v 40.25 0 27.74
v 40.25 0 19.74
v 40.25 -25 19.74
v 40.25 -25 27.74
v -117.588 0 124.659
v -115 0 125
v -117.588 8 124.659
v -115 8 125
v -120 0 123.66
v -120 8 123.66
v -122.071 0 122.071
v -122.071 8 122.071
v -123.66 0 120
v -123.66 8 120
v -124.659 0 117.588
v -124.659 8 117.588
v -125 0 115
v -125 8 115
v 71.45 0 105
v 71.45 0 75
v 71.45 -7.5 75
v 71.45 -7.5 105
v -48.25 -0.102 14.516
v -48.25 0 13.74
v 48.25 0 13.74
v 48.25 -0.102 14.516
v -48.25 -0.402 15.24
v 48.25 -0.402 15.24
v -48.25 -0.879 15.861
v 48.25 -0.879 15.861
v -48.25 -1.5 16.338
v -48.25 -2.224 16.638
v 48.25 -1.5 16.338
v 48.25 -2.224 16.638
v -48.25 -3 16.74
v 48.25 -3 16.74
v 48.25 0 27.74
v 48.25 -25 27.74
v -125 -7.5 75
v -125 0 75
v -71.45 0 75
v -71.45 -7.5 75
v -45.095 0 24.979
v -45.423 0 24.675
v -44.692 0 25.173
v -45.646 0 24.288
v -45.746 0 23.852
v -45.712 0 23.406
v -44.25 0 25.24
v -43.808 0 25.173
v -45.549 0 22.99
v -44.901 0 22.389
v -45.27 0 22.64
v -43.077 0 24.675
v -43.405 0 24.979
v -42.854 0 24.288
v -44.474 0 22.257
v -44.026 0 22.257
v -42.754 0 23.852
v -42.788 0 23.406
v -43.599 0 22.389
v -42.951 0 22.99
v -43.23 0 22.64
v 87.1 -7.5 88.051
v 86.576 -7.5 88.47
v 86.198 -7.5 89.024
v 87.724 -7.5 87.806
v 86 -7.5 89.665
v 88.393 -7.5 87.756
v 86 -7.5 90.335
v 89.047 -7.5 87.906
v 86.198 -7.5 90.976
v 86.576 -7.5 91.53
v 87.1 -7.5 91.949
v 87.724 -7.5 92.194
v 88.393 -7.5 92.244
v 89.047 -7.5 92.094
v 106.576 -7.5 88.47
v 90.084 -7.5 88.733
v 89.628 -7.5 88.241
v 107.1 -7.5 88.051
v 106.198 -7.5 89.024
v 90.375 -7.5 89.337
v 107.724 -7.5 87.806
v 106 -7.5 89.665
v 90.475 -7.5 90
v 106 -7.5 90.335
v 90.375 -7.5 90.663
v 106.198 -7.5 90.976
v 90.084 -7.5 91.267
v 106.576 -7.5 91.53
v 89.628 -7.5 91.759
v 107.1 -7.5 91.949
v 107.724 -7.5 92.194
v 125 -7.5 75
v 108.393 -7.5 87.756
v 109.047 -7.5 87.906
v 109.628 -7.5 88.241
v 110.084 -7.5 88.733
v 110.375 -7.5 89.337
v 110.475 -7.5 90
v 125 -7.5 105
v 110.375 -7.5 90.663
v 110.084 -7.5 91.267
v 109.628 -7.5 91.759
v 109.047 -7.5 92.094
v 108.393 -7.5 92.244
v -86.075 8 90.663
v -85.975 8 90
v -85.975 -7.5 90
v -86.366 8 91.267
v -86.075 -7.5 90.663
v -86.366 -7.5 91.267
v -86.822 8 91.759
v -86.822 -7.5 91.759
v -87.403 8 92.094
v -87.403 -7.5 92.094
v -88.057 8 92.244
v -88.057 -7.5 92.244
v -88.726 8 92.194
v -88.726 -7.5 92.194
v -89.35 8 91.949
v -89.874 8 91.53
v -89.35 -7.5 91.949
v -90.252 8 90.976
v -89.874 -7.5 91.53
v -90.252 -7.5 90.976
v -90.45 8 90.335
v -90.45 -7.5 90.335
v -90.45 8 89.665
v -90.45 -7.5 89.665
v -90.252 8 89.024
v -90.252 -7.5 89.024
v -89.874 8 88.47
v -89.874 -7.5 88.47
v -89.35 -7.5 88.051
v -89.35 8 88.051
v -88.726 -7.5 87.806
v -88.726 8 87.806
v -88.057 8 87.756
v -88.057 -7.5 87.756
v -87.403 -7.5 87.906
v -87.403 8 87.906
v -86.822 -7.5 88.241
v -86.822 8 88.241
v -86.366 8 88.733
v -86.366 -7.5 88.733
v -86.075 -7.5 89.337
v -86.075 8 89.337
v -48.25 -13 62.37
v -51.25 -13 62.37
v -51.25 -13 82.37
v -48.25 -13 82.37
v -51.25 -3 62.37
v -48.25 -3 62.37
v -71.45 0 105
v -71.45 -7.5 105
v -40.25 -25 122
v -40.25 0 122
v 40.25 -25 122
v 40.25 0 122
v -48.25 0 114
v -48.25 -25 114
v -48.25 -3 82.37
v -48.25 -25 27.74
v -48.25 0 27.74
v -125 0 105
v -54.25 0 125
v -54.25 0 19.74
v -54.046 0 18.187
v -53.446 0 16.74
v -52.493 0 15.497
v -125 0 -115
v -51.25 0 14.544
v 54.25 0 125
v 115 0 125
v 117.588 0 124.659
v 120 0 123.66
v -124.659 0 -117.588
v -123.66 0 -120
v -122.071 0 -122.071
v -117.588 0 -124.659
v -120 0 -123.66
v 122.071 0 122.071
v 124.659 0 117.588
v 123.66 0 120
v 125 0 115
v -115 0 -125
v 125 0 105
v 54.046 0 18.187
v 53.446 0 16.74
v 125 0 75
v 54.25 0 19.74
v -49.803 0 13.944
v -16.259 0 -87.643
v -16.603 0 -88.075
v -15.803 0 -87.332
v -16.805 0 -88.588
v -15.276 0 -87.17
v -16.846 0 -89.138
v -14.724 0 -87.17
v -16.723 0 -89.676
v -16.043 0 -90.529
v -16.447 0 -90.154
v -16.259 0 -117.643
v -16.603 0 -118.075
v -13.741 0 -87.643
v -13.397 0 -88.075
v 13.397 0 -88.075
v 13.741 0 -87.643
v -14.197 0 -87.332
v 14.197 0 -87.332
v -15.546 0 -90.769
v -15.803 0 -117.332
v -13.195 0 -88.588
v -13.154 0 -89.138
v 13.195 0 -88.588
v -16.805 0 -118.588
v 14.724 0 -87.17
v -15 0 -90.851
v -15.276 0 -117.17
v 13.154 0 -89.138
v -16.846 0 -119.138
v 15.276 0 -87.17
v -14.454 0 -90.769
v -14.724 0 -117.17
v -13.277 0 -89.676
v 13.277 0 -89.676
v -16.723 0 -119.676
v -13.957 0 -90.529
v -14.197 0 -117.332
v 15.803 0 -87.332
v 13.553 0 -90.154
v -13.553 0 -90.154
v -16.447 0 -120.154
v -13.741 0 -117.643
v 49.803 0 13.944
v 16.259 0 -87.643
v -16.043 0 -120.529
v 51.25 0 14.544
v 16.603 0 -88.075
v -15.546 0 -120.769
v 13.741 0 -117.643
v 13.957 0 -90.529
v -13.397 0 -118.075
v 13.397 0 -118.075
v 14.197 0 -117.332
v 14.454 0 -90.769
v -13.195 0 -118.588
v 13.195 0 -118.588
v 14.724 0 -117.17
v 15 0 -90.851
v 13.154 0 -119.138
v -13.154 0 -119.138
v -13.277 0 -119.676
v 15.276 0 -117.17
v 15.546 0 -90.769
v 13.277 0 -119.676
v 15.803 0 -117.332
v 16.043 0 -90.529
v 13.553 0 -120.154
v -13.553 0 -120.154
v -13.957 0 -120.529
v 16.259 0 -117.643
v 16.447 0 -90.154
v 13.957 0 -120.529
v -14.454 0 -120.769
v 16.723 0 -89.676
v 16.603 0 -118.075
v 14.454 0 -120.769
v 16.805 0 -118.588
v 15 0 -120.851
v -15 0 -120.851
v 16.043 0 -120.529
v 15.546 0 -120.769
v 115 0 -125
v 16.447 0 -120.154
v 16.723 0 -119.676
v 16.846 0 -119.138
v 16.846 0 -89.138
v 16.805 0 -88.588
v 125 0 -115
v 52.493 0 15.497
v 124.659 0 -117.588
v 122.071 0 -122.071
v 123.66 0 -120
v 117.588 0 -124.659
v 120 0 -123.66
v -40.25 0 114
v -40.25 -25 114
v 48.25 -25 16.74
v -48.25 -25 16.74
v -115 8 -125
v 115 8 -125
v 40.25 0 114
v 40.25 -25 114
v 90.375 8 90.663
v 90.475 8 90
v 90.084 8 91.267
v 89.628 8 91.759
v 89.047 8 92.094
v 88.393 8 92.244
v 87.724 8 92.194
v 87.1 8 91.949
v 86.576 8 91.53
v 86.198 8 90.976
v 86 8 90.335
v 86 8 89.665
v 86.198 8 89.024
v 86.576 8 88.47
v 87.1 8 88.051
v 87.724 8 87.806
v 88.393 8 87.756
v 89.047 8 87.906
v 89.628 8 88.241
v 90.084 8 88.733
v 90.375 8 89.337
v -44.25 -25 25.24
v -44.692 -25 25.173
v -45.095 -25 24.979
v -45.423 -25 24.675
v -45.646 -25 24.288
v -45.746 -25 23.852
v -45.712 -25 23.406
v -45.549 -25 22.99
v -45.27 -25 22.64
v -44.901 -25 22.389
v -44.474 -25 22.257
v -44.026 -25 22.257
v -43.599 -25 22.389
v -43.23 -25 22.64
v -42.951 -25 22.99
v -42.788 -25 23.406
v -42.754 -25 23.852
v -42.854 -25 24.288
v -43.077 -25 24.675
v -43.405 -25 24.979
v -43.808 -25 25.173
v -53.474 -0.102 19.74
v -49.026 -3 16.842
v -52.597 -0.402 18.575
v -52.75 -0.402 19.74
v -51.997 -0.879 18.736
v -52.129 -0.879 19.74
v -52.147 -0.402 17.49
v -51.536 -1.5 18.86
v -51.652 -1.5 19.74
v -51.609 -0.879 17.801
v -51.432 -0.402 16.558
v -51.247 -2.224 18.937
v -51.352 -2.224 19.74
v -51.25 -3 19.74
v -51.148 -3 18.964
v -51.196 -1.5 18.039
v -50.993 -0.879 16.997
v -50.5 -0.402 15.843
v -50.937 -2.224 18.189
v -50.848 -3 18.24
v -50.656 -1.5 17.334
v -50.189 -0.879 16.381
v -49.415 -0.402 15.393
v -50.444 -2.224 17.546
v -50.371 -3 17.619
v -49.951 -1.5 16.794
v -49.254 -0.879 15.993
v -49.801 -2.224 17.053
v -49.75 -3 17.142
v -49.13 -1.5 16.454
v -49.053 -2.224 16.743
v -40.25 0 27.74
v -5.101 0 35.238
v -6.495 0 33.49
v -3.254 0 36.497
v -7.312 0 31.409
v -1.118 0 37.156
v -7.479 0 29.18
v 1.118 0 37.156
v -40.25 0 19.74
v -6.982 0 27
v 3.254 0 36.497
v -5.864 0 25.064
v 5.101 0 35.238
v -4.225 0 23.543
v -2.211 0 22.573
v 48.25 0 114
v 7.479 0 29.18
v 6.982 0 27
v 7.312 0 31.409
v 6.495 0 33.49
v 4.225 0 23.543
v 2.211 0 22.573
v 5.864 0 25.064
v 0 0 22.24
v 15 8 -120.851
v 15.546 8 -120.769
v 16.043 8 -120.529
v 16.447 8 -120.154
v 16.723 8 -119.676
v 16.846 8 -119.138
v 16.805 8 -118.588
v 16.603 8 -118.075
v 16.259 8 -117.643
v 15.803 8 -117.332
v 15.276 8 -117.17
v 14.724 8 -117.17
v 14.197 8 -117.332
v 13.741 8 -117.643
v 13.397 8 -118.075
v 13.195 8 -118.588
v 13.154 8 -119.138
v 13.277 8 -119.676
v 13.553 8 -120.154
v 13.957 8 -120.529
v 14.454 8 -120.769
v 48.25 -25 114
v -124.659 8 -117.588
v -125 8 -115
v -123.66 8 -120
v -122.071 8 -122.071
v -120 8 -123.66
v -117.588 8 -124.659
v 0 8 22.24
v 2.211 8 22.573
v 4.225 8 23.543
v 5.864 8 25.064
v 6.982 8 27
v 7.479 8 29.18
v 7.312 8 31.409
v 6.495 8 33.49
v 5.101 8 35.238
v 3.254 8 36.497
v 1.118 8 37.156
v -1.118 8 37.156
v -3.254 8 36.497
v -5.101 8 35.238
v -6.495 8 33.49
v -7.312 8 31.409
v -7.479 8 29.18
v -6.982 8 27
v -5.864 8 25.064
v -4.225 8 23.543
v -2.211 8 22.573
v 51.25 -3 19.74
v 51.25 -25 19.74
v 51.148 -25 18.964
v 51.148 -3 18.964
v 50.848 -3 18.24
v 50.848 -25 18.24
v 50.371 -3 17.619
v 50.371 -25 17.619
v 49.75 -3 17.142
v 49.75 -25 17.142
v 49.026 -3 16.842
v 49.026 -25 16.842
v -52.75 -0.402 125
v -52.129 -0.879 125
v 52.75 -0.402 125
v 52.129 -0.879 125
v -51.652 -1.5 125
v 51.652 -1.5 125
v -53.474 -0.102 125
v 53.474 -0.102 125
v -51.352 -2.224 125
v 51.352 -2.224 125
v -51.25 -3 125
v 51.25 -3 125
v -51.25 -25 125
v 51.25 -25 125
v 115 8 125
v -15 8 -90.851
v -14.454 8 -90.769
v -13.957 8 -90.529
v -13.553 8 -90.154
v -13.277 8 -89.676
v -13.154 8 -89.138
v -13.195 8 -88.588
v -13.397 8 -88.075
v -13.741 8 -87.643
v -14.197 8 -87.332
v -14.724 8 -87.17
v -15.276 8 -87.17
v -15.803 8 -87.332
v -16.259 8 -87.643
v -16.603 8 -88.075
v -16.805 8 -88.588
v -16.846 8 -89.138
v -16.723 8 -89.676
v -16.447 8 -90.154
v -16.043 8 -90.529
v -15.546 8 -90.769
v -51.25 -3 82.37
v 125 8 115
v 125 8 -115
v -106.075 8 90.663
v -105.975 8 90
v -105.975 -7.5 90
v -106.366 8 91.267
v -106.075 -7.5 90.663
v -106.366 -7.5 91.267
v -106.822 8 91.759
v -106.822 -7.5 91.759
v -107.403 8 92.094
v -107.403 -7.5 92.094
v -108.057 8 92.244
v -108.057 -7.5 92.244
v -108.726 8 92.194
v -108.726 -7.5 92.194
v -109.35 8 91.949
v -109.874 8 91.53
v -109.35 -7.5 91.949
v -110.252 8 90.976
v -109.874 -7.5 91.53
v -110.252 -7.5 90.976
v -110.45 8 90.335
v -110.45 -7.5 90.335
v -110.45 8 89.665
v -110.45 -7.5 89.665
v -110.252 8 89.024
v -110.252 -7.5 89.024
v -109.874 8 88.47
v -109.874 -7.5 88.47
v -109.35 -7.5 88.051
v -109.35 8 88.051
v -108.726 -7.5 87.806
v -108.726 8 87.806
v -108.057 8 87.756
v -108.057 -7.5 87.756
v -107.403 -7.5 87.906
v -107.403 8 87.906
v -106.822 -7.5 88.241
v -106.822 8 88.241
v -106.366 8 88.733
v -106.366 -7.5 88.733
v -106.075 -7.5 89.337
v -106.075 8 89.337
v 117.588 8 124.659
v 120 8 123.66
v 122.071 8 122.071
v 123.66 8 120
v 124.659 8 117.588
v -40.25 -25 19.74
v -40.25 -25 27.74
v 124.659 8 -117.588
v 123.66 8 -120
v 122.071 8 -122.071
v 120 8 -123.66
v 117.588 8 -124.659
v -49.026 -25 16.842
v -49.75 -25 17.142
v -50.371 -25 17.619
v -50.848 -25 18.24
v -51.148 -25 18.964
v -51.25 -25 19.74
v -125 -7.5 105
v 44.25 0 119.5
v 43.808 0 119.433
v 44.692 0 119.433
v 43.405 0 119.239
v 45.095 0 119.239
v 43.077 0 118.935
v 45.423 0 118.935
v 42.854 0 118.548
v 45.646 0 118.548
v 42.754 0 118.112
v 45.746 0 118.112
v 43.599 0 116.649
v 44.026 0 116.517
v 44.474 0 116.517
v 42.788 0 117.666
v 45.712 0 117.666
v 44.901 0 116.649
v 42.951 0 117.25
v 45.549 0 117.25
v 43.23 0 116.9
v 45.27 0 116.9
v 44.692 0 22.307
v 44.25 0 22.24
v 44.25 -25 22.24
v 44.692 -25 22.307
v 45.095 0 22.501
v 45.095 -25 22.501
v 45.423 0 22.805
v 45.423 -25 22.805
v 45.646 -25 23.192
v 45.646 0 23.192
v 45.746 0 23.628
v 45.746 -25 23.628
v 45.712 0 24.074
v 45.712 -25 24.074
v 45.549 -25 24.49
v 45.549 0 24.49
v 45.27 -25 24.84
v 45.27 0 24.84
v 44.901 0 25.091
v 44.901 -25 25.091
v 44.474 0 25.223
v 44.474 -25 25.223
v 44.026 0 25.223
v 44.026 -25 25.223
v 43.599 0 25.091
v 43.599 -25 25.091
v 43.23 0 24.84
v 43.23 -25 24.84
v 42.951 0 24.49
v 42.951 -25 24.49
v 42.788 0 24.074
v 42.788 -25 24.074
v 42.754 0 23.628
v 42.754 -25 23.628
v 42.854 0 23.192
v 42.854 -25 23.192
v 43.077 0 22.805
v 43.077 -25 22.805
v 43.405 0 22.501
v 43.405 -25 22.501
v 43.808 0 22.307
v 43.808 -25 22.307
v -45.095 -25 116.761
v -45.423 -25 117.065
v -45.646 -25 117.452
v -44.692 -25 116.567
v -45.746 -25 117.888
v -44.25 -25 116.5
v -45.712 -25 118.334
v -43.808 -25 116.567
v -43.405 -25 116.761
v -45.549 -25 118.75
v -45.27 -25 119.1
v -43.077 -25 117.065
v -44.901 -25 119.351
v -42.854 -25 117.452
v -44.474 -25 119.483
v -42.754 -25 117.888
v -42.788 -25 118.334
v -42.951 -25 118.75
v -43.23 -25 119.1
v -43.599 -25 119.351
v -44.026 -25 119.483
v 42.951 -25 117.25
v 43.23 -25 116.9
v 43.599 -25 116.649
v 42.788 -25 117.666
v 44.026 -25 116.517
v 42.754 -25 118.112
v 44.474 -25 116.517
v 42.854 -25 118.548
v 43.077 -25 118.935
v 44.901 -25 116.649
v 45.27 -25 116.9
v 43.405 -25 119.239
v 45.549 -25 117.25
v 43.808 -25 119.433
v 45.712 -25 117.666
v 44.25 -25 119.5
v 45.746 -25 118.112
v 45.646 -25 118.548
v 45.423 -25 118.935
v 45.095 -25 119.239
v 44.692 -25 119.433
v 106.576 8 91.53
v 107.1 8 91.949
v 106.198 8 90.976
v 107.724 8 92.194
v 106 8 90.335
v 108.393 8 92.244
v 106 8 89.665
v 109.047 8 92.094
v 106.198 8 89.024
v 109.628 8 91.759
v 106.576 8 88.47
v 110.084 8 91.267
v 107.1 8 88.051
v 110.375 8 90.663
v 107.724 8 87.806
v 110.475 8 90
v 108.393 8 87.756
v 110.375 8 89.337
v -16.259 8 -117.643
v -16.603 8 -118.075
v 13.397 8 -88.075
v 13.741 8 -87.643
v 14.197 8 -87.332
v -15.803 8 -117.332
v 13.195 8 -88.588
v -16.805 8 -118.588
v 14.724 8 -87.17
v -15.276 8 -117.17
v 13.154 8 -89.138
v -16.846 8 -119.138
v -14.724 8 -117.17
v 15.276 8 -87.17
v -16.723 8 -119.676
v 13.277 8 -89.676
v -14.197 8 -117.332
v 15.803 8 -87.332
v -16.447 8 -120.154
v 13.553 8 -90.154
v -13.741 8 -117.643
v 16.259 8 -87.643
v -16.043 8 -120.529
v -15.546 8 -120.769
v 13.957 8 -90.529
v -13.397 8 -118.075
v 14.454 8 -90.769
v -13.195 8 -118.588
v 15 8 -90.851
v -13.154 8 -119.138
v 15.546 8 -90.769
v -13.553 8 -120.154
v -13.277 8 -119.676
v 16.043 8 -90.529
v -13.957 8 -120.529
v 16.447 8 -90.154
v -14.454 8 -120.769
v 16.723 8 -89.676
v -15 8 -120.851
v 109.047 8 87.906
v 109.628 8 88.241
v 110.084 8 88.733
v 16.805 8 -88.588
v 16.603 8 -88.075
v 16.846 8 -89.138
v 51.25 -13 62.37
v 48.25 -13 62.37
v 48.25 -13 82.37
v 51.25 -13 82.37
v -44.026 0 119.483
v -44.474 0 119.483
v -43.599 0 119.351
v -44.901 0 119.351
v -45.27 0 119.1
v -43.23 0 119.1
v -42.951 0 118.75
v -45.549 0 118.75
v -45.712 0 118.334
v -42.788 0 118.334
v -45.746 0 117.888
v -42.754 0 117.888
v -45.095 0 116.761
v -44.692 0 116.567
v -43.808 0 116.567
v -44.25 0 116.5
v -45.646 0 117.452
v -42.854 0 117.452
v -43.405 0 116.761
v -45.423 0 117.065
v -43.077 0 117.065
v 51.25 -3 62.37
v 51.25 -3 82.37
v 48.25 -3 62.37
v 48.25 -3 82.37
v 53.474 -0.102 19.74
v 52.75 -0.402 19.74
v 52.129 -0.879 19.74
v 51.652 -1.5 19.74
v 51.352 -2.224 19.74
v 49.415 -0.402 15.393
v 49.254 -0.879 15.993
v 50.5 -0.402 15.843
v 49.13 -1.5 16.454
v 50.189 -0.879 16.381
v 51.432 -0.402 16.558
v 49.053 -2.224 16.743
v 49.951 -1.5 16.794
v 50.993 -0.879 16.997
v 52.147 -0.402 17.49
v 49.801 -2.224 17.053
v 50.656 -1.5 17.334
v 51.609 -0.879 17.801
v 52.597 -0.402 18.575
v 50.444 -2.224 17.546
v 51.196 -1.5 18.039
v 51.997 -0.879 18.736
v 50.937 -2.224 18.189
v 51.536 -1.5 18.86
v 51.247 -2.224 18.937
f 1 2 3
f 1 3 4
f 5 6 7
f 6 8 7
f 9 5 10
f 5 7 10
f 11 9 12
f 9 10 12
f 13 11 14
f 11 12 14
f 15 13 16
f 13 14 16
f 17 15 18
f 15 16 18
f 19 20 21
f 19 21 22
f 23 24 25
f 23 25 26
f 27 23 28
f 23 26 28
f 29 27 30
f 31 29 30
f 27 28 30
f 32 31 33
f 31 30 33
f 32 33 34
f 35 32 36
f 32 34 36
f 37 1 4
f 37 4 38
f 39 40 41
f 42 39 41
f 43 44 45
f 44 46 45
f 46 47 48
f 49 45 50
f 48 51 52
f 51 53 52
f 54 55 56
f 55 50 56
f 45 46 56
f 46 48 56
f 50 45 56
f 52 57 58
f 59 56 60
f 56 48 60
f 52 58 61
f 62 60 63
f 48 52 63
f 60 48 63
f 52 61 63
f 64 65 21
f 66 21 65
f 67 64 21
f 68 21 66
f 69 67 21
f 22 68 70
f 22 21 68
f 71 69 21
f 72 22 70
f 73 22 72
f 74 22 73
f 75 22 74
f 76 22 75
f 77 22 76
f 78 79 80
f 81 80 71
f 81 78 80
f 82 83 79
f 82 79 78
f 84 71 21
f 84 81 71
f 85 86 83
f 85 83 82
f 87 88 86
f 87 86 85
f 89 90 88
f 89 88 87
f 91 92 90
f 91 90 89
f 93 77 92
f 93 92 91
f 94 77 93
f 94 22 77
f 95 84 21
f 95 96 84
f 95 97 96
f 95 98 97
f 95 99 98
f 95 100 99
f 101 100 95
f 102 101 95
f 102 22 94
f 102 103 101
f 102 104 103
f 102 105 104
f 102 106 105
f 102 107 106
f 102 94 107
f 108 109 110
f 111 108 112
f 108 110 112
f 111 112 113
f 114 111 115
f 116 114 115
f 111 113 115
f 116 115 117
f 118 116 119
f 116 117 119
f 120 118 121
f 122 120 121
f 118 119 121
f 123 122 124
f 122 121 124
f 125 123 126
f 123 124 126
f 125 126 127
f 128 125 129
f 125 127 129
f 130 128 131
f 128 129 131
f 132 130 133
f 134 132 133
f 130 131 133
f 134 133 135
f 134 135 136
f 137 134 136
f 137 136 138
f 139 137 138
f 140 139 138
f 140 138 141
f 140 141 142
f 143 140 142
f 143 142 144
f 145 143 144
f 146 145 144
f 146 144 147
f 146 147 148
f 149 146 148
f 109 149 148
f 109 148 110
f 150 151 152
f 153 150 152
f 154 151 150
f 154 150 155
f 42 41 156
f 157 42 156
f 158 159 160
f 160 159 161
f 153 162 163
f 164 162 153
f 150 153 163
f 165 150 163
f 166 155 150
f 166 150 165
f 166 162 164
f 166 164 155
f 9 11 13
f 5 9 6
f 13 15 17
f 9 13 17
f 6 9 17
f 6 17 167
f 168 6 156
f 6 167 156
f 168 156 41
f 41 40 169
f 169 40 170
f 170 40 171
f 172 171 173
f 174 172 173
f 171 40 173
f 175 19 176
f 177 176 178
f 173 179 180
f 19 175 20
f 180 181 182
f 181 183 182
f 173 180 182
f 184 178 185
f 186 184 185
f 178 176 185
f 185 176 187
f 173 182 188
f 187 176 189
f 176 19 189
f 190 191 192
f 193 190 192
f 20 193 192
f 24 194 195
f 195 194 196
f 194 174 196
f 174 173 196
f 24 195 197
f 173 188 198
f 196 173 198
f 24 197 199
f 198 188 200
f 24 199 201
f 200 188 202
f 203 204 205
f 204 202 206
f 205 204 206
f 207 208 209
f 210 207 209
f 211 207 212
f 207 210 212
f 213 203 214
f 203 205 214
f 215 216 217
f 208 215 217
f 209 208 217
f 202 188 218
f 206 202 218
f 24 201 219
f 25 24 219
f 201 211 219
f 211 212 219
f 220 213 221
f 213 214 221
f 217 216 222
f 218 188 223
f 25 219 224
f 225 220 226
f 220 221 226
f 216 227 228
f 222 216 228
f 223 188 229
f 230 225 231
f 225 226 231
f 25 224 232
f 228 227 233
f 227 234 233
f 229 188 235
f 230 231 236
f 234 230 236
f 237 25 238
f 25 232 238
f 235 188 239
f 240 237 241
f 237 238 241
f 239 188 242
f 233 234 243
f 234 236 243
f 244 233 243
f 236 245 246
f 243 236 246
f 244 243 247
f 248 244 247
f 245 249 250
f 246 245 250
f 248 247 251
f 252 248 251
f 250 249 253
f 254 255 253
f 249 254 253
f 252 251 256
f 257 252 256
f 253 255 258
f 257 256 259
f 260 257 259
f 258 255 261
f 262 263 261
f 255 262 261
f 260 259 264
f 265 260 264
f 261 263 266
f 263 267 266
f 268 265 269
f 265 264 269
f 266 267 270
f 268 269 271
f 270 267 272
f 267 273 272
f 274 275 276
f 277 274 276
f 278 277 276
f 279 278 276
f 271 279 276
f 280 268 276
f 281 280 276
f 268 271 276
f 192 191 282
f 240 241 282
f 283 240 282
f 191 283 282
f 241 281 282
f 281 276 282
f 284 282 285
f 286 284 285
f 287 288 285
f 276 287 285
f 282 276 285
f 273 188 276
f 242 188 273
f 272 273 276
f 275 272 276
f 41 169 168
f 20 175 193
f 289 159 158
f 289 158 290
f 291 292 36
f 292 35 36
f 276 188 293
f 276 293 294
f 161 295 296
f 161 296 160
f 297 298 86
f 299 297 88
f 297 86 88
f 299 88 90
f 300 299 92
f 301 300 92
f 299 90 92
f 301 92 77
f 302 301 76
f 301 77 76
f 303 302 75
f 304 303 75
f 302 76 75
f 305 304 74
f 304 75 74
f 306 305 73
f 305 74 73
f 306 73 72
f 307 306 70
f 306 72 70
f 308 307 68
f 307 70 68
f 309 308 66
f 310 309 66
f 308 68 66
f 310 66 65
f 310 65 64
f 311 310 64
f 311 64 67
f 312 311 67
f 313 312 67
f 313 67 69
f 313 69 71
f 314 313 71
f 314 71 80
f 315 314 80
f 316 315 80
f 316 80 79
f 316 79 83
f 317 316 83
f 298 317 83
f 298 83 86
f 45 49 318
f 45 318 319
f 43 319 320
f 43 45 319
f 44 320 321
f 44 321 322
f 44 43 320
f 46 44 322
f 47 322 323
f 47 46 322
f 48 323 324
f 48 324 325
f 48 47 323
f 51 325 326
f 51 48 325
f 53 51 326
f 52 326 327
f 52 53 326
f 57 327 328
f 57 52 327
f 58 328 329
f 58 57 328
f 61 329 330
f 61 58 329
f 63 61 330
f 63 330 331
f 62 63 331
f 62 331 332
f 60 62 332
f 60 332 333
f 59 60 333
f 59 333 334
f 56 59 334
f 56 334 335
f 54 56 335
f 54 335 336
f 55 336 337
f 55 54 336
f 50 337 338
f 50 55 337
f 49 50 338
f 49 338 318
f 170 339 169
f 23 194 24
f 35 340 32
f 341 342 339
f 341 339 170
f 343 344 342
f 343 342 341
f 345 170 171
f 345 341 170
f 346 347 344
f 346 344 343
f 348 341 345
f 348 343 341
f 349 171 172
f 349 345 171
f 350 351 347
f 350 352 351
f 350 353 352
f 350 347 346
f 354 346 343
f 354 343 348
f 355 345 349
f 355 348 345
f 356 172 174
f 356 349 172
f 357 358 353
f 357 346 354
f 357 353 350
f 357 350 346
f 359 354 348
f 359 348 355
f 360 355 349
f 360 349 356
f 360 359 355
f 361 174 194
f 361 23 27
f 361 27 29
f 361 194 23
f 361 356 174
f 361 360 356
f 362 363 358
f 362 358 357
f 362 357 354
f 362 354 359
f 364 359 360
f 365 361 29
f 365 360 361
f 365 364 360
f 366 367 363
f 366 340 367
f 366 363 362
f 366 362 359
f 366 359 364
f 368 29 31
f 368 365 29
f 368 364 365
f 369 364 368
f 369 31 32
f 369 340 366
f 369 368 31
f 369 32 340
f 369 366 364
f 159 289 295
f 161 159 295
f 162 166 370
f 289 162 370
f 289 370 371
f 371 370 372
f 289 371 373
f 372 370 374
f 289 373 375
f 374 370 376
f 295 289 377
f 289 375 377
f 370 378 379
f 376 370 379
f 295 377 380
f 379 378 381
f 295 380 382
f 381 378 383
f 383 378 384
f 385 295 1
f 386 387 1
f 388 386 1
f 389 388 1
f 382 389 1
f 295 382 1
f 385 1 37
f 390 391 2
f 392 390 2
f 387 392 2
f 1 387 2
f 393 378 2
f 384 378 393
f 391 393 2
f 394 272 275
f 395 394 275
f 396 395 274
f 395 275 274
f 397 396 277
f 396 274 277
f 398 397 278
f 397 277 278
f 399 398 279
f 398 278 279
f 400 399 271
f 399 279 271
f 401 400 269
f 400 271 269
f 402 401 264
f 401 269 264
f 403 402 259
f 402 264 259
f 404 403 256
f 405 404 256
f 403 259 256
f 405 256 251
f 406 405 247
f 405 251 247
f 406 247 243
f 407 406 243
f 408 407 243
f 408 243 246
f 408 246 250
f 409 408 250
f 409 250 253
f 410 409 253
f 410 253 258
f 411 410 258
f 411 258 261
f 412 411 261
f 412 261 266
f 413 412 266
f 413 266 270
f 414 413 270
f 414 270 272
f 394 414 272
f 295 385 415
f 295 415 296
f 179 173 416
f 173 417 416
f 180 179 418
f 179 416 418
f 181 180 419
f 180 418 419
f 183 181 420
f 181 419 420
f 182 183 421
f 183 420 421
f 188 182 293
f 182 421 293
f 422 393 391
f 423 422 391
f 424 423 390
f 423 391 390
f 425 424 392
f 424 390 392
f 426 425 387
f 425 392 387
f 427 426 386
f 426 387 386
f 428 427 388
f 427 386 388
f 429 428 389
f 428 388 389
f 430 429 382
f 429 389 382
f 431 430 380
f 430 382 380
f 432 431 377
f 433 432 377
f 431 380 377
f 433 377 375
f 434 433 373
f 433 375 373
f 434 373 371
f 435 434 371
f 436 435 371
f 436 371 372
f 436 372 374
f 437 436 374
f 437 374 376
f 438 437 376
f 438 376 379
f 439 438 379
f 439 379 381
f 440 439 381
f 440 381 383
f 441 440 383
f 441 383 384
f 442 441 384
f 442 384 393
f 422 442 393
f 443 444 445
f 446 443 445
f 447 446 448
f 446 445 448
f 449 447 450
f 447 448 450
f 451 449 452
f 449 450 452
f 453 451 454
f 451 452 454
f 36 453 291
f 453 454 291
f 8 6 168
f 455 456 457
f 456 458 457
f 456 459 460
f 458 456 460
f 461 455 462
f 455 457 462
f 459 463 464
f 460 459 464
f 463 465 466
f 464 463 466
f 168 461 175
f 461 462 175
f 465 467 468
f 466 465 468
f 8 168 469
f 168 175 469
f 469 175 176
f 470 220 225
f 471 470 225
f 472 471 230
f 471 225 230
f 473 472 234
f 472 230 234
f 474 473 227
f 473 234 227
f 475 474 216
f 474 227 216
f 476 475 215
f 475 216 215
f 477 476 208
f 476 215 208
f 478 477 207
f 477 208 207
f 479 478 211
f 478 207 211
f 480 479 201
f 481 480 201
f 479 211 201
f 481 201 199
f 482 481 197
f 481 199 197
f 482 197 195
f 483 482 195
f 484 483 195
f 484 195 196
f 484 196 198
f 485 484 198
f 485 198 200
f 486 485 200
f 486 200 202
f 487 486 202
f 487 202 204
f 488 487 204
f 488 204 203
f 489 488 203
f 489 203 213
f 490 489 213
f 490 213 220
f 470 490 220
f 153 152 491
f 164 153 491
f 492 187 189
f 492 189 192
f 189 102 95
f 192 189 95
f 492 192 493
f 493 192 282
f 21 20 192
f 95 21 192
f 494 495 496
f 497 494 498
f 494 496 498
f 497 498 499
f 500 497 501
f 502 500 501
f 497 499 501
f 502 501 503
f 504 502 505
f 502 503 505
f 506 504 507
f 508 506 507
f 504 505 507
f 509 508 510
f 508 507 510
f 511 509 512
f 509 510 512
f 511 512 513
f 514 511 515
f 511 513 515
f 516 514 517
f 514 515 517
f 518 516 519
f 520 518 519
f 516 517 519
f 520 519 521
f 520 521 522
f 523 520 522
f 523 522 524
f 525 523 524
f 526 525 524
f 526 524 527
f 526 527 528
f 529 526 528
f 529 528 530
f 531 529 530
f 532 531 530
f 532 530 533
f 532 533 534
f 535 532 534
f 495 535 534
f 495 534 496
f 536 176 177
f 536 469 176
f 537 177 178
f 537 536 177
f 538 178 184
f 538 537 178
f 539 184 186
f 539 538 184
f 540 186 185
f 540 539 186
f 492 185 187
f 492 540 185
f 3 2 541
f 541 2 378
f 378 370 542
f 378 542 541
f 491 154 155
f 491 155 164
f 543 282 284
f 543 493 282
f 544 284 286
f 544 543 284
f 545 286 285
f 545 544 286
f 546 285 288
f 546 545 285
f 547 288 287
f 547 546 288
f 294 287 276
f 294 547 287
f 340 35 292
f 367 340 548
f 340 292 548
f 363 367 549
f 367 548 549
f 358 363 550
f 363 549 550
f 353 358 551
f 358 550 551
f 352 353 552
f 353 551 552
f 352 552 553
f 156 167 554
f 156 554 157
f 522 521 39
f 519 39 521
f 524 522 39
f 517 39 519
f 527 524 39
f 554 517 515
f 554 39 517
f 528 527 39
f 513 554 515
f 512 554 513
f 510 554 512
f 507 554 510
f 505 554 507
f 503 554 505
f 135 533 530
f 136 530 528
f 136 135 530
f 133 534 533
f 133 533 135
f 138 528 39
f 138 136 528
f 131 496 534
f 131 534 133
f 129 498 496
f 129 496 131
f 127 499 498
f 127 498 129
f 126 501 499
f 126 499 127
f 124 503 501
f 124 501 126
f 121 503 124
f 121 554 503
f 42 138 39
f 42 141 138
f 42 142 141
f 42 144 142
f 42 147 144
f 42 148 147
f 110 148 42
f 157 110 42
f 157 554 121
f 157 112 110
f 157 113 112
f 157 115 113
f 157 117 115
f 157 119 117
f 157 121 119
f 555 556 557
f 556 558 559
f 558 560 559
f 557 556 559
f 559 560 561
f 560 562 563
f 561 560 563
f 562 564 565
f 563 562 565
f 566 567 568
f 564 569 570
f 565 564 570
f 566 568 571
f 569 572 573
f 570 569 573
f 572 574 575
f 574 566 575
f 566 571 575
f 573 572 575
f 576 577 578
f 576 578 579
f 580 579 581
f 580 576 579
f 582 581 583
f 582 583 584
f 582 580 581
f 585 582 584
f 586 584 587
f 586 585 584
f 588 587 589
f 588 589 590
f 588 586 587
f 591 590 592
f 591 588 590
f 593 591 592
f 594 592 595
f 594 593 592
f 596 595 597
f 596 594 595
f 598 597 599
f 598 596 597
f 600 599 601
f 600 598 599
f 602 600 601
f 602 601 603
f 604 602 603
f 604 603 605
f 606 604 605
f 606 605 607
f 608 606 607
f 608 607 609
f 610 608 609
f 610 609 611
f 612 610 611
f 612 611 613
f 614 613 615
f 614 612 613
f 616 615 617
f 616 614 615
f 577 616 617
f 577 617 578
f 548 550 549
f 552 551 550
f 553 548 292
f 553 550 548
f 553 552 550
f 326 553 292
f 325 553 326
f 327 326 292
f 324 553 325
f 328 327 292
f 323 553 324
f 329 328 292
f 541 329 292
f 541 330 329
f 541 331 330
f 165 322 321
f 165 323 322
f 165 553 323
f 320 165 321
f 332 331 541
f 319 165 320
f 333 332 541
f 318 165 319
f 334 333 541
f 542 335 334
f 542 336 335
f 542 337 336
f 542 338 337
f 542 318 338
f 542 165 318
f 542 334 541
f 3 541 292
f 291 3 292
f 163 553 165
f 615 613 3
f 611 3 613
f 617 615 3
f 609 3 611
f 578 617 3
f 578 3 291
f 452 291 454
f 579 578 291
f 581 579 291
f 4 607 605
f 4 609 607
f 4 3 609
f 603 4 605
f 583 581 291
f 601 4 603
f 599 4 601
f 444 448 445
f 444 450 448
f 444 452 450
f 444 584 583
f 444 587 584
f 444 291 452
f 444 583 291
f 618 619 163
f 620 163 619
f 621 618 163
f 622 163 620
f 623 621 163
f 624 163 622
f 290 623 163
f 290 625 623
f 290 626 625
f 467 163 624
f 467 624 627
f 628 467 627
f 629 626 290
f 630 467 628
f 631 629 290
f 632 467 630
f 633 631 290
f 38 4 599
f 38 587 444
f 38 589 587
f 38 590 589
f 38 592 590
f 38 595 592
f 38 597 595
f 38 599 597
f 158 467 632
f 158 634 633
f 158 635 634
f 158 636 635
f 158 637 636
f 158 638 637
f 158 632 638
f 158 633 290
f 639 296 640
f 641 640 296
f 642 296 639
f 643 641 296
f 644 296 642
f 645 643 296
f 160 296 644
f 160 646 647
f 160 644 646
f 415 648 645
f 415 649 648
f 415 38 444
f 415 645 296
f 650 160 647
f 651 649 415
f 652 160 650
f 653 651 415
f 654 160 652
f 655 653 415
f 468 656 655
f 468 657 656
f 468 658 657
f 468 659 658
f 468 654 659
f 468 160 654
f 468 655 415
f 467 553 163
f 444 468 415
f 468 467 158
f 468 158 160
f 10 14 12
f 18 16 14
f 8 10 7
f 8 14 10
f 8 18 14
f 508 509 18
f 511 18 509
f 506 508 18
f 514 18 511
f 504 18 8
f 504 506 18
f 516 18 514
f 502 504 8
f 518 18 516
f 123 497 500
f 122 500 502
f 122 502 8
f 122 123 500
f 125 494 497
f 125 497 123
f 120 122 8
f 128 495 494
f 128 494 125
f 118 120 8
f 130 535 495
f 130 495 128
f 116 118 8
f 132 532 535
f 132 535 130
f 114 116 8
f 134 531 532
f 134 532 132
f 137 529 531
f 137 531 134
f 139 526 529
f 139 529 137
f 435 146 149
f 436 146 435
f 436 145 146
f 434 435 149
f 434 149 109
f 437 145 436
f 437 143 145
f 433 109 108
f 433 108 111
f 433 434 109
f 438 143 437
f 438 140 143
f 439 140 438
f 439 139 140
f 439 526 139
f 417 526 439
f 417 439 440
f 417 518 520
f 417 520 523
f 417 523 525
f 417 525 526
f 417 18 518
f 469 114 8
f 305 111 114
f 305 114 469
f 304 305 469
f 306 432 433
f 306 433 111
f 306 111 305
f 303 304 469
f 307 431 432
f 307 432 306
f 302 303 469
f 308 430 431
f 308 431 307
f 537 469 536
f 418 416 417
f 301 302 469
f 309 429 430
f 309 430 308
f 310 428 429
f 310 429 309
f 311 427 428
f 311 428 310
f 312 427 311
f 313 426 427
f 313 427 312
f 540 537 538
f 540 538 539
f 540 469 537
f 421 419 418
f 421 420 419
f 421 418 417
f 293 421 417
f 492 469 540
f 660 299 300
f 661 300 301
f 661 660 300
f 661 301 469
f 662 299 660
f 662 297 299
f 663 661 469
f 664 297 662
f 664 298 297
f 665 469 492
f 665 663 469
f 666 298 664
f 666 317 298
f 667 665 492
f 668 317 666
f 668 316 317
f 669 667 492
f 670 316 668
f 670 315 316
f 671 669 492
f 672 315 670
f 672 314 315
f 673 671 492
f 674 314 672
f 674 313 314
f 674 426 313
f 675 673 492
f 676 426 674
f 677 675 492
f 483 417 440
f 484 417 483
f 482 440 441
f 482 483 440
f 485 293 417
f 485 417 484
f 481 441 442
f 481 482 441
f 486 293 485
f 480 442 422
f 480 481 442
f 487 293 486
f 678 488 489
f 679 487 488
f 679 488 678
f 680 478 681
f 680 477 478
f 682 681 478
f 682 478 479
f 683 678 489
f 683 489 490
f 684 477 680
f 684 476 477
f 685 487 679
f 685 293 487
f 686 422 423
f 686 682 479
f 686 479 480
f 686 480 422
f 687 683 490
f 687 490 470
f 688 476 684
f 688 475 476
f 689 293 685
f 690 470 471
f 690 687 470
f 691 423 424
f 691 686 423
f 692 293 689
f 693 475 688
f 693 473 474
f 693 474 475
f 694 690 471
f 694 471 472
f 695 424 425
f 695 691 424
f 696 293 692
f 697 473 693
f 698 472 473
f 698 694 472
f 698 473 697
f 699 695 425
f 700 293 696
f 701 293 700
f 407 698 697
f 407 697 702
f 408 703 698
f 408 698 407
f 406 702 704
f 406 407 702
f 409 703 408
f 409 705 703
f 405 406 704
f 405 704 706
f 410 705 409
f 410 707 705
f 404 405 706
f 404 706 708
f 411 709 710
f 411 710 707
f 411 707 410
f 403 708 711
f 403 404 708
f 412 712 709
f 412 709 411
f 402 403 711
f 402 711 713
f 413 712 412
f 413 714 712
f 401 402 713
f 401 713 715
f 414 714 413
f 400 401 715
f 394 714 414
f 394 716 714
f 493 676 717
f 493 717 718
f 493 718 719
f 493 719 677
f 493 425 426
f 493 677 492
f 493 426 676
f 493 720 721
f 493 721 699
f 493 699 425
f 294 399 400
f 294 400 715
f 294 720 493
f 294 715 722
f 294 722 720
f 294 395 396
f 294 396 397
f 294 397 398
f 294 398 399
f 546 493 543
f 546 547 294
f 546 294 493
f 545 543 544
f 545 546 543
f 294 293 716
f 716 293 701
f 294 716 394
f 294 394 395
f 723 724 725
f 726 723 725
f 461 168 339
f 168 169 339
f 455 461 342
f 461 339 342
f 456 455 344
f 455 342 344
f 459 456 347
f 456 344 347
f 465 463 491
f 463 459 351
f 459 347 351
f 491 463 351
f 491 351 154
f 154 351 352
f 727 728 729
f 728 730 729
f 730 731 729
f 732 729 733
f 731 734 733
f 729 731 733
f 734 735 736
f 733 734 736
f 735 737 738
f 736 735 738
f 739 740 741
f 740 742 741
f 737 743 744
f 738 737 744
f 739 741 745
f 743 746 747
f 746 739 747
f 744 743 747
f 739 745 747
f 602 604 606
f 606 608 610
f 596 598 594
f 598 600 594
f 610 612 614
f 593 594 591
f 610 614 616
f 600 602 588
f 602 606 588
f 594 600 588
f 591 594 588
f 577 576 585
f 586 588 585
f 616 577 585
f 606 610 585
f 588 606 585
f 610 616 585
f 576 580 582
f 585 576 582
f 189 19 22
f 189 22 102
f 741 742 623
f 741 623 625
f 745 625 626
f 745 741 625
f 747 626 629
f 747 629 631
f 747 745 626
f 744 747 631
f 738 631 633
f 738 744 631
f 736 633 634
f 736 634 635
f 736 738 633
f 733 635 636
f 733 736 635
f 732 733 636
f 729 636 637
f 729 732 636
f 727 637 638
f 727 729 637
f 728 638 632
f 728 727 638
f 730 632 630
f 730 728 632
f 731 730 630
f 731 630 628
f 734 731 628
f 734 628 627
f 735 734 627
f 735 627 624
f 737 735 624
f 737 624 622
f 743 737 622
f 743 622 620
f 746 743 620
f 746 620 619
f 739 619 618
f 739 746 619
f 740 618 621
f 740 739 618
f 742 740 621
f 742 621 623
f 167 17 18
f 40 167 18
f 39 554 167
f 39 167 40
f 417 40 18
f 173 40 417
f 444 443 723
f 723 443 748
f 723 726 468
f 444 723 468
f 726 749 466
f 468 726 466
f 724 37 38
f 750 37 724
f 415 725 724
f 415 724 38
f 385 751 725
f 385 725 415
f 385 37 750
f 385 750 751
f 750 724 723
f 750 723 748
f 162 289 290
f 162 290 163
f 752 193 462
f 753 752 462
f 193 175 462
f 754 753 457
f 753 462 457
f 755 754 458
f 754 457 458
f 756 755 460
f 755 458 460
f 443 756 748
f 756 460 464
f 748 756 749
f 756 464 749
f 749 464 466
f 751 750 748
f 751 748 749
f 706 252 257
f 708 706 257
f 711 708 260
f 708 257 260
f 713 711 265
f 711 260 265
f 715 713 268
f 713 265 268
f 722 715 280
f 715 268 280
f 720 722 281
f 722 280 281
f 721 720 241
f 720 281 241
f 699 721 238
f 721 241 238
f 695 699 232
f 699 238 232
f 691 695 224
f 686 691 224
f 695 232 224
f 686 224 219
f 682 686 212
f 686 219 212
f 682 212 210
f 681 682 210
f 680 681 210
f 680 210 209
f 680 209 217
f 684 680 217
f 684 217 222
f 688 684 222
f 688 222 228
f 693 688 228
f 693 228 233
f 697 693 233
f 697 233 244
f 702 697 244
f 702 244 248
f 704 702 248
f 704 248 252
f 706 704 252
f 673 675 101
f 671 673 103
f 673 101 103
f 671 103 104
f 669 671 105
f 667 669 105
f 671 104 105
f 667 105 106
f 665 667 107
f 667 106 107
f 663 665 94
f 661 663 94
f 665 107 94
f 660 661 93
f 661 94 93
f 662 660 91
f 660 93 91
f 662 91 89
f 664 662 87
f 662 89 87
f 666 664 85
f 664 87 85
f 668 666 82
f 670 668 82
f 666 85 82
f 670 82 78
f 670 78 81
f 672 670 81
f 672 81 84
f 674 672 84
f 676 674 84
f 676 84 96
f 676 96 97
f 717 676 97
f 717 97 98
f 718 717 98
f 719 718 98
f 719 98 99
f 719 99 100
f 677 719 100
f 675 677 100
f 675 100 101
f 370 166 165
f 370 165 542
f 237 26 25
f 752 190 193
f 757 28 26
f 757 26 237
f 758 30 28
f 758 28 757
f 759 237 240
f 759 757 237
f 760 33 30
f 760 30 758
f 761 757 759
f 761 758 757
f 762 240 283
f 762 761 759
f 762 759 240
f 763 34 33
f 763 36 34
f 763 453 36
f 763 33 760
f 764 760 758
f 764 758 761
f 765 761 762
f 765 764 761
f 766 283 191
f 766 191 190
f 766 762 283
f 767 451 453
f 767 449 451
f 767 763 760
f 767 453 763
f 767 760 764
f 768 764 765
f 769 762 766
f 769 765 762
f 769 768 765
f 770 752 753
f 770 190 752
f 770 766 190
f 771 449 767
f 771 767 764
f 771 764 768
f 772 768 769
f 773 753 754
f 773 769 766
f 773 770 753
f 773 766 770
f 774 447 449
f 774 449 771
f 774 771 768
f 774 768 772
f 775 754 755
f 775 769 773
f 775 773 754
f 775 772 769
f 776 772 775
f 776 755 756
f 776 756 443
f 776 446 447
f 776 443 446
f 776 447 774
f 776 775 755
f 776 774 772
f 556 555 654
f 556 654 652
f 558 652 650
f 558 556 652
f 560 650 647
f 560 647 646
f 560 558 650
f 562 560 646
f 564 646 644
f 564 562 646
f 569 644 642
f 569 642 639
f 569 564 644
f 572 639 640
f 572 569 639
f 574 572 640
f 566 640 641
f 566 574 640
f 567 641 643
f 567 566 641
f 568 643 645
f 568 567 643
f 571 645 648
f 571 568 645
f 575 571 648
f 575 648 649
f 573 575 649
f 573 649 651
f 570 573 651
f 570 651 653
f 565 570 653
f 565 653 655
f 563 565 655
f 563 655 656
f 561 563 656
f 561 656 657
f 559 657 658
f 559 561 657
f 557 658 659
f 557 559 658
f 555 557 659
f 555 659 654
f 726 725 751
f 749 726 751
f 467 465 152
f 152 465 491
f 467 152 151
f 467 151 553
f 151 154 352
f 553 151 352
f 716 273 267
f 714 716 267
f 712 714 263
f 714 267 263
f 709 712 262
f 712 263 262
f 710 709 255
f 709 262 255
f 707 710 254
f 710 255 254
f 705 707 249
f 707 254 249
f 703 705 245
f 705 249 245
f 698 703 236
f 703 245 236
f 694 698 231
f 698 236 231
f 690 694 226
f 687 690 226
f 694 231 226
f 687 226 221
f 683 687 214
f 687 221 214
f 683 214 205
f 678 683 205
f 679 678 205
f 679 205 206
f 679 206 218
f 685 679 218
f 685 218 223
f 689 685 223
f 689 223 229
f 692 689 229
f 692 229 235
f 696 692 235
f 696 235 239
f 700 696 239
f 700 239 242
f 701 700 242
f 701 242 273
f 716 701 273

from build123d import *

# Parameters (mm, degrees)
SKETCH1_W           = 250
SKETCH1_H           = 250
BOSS_EXTRUDE1_DEPTH = 8
SKETCH2_W           = 53.55
SKETCH2_H           = 30
BOSS_EXTRUDE2_DEPTH = 7.5
SKETCH3_R           = 2.25
CUT_EXTRUDE1_DEPTH  = 178.454923854
SKETCH4_R           = 1.5
BOSS_EXTRUDE3_DEPTH = 25
FILLET1_R           = 3
CUT_EXTRUDE2_REACH  = 219.518
SKETCH5_W           = 20
SKETCH5_H           = 10
SKETCH6_R           = 1.85096309
SKETCH6_R_2         = 7.5
CUT_EXTRUDE3_DEPTH  = 20
FILLET2_R           = 10


with BuildPart() as part:
    # Sketch1 → Boss-Extrude1 (new body)
    with BuildSketch(Plane(origin=(0, 0, 0), x_dir=(1, 0, 0), z_dir=(0, 1, 0))):
        Rectangle(SKETCH1_W, SKETCH1_H)
    extrude(amount=BOSS_EXTRUDE1_DEPTH)

    # Sketch2 → Boss-Extrude2 (add)
    with BuildSketch(Plane.XZ):
        with Locations((-98.225, 90)):
            Rectangle(SKETCH2_W, SKETCH2_H)
        with Locations((98.225, 90)):
            Rectangle(SKETCH2_W, SKETCH2_H)
    extrude(amount=BOSS_EXTRUDE2_DEPTH)

    # Sketch3 → Cut-Extrude1 (cut, through all)
    with BuildSketch(Plane.XZ.offset(7.5)):
        with Locations((108.225, 90)):
            Circle(SKETCH3_R)
        with Locations((88.225, 90)):
            Circle(SKETCH3_R)
        with Locations((-108.225, 90)):
            Circle(SKETCH3_R)
        with Locations((-88.225, 90)):
            Circle(SKETCH3_R)
    extrude(amount=-CUT_EXTRUDE1_DEPTH, mode=Mode.SUBTRACT)

    # Sketch4 → Boss-Extrude3 (add)
    with BuildSketch(Plane.XZ):
        Polygon((0, 125), (-51.24999854, 125), (-51.24999854, 16.74000082), (0, 16.74000082), (51.24999854, 16.74000082), (51.24999854, 125), align=None)
        with Locations(Location((-44.24999854, 118, 0), (0, 0, 270))):
            Circle(SKETCH4_R, mode=Mode.SUBTRACT)
        with Locations(Location((44.24999854, 118, 0), (0, 0, 90))):
            Circle(SKETCH4_R, mode=Mode.SUBTRACT)
        with Locations(Location((44.24999854, 23.74000082, 0), (0, 0, 270))):
            Circle(SKETCH4_R, mode=Mode.SUBTRACT)
        with Locations(Location((-44.24999854, 23.74000082, 0), (0, 0, 90))):
            Circle(SKETCH4_R, mode=Mode.SUBTRACT)
        Polygon((0, 122), (-40.24999854, 122), (-40.24999854, 114), (-48.24999854, 114), (-48.24999854, 27.74000082), (-40.24999854, 27.74000082), (-40.24999854, 19.74000082), (0, 19.74000082), (40.24999854, 19.74000082), (40.24999854, 27.74000082), (48.24999854, 27.74000082), (48.24999854, 114), (40.24999854, 114), (40.24999854, 122), align=None, mode=Mode.SUBTRACT)
    extrude(amount=BOSS_EXTRUDE3_DEPTH)

    # Fillet1
    fillet1_edges = [part.edges().sort_by_distance(p)[0] for p in [
        (-51.24999854, 0, 70.87000041),
        (0, 0, 16.74000082),
        (-51.24999854, -12.5, 16.74000082),
        (51.24999854, 0, 70.87000041),
        (51.24999854, -12.5, 16.74000082),
    ]]
    fillet(fillet1_edges, radius=FILLET1_R)

    # Cut-Extrude2: up to this face of the body (flat: up to its plane)
    cut_extrude2_end = Plane(part.part.faces().sort_by_distance((51.24999854, -14, 72.37000041))[0])
    # Sketch5 → Cut-Extrude2 (cut, up to the picked face)
    with BuildSketch(Plane.ZY.offset(51.24999854), mode=Mode.PRIVATE) as cut_extrude2_sk1:
        with Locations((72.37000041, -8)):
            Rectangle(SKETCH5_W, SKETCH5_H)
    cut_extrude2_tool1 = split(extrude(cut_extrude2_sk1.sketch, amount=-CUT_EXTRUDE2_REACH, mode=Mode.PRIVATE), bisect_by=cut_extrude2_end, keep=Keep.BOTH, mode=Mode.PRIVATE)
    add(cut_extrude2_tool1.solids().sort_by(Axis((-51.249999, -8, 72.37), (1, 0, 0)))[0], mode=Mode.SUBTRACT)

    # Sketch6 → Cut-Extrude3 (cut)
    with BuildSketch(Plane.XZ):
        with Locations(Location((-15, -89, 0), (0, 0, 270))):
            Circle(SKETCH6_R)
        with Locations(Location((15, -89, 0), (0, 0, 270))):
            Circle(SKETCH6_R)
        with Locations(Location((15, -119, 0), (0, 0, 270))):
            Circle(SKETCH6_R)
        with Locations(Location((-15, -119, 0), (0, 0, 270))):
            Circle(SKETCH6_R)
        with Locations(Location((0, 29.74000082, 0), (0, 0, 270))):
            Circle(SKETCH6_R_2)
    extrude(amount=-CUT_EXTRUDE3_DEPTH, mode=Mode.SUBTRACT)

    # Fillet2
    fillet2_edges = [part.edges().sort_by_distance(p)[0] for p in [
        (125, 4, 125),
        (-125, 4, 125),
        (-125, 4, -125),
        (125, 4, -125),
    ]]
    fillet(fillet2_edges, radius=FILLET2_R)


solid = part.part
